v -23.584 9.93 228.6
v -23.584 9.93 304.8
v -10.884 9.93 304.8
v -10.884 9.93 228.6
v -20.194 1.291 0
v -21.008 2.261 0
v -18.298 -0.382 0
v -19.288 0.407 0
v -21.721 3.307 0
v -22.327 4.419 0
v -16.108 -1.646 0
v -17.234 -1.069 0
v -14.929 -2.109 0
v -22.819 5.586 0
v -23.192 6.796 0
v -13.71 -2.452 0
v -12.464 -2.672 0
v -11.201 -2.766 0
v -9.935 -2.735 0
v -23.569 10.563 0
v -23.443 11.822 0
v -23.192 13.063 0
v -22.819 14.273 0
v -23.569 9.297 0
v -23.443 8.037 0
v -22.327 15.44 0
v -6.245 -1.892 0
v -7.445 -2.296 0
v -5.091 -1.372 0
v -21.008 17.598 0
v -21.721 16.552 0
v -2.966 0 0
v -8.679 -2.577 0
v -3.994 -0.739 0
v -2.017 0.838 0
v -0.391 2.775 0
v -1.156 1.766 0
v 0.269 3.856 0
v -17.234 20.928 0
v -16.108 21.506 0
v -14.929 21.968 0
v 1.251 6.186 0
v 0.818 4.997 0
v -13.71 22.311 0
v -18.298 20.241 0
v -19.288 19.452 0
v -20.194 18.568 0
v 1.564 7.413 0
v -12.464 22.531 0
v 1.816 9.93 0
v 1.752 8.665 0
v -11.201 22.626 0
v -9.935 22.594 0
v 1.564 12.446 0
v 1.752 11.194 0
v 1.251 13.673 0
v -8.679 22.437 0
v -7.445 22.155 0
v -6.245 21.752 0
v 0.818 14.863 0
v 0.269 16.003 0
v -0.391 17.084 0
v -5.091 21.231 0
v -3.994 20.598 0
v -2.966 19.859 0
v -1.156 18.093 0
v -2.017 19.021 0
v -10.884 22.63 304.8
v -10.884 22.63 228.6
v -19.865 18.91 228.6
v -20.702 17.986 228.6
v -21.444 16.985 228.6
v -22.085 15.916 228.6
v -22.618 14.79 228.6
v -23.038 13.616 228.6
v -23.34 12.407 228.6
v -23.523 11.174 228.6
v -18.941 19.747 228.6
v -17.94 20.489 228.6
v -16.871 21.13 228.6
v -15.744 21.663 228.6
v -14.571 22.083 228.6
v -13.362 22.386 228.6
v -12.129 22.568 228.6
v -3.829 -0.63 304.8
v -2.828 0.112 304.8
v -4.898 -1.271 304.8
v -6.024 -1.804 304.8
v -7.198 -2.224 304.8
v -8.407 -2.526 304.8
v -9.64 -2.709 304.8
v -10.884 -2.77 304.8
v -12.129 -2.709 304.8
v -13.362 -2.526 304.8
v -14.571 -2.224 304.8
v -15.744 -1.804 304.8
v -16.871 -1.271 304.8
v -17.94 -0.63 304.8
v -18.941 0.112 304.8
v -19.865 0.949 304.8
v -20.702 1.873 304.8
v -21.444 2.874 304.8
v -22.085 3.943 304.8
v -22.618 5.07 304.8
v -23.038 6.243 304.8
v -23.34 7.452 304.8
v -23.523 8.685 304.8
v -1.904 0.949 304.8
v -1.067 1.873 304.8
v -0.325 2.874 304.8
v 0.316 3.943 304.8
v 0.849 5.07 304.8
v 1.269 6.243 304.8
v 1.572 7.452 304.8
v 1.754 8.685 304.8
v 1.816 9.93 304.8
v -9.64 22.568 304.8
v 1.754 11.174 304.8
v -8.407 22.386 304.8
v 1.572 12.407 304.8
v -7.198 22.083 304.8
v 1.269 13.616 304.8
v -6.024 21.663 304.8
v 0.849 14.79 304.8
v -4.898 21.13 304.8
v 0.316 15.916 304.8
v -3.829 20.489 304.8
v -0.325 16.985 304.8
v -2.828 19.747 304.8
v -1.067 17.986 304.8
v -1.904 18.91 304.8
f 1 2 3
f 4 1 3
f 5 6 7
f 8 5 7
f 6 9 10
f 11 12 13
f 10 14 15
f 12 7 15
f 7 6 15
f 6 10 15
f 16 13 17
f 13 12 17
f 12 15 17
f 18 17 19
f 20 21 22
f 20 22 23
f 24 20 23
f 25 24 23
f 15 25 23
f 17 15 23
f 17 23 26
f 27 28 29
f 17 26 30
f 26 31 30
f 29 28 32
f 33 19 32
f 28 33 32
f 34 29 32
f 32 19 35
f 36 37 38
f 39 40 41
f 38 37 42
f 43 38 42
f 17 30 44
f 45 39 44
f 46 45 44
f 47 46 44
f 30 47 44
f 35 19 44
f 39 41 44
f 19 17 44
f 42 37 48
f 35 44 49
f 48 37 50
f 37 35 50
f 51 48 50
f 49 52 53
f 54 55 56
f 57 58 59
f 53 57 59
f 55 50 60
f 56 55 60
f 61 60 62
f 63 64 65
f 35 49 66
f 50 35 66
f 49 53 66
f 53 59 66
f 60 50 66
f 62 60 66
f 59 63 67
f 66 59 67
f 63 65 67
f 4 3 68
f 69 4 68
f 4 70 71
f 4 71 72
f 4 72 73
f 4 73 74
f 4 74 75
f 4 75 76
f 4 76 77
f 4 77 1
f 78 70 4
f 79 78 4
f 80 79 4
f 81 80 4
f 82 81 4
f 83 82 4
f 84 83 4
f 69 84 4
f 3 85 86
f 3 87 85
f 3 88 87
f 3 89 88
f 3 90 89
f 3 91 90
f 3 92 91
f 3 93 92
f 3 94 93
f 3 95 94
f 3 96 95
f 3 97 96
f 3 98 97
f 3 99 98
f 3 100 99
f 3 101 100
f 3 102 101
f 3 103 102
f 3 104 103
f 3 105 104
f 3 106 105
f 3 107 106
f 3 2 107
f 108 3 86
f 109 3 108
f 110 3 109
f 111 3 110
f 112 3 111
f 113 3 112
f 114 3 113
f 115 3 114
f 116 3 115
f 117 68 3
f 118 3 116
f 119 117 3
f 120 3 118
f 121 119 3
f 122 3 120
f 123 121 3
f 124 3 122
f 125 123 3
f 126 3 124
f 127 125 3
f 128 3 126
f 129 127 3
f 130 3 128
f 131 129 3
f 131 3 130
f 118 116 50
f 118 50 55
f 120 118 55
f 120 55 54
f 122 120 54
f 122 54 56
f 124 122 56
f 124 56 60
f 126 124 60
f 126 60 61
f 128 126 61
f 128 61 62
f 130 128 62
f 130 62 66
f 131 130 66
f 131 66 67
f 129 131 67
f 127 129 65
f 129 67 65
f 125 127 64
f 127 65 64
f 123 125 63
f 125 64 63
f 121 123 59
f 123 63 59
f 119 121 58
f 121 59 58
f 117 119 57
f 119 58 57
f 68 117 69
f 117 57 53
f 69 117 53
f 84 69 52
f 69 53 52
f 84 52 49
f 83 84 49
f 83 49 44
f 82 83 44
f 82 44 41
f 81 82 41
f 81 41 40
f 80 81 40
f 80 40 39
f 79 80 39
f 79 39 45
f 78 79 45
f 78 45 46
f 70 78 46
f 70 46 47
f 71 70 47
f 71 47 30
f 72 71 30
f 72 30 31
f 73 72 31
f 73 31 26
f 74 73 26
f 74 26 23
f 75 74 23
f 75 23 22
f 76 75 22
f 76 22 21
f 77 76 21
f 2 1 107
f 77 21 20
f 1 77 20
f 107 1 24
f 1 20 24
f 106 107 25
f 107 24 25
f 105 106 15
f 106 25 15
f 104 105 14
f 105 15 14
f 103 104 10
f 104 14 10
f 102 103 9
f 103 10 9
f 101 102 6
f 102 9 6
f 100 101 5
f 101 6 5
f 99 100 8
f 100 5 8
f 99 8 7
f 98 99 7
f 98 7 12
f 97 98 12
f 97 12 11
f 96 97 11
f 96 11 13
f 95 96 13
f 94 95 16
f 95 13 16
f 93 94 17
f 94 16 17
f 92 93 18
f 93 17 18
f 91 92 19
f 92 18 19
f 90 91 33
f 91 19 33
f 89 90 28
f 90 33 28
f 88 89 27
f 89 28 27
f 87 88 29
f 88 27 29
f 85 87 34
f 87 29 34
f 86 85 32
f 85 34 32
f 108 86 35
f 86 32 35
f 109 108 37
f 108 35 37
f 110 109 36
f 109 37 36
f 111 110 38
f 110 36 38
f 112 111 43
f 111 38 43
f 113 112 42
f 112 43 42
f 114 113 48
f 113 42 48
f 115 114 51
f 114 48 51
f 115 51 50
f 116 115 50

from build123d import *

# Parameters (mm, degrees)
F0_R     = 12.7
F1_DEPTH = 304.8
F3_DEPTH = 76.2
F5_DEPTH = 76.2


with BuildPart() as f1:
    # F0 (on Top) → F1 (new body)
    with BuildSketch(Plane.XY):
        with Locations((-10.884415, 9.929642)):
            Circle(F0_R)
    extrude(amount=F1_DEPTH)

    # F2 (on face) → F3 (cut)
    with BuildSketch(Plane.XY.offset(304.8)):
        with BuildLine():
            ThreePointArc((1.815585, 9.929642), (1.714362, 11.529897), (1.412307, 13.104642))
            Line((1.412307, 13.104642), (-4.937693, 13.104642))
            Line((-4.937693, 13.104642), (-4.937693, 6.754642))
            Line((-4.937693, 6.754642), (1.412307, 6.754642))
            ThreePointArc((1.412307, 6.754642), (1.714362, 8.329388), (1.815585, 9.929642))
        make_face()
    extrude(amount=F3_DEPTH, mode=Mode.SUBTRACT)

    # F4 (on face) → F5 (cut)
    with BuildSketch(Plane.XY.offset(304.8)):
        with BuildLine():
            Line((-23.584415, 9.929642), (-10.884415, 9.929642))
            Line((-10.884415, 9.929642), (-10.884415, 22.629642))
            ThreePointArc((-10.884415, 22.629642), (-19.864671, 18.909898), (-23.584415, 9.929642))
        make_face()
    extrude(amount=-F5_DEPTH, mode=Mode.SUBTRACT)


solid = f1.part
